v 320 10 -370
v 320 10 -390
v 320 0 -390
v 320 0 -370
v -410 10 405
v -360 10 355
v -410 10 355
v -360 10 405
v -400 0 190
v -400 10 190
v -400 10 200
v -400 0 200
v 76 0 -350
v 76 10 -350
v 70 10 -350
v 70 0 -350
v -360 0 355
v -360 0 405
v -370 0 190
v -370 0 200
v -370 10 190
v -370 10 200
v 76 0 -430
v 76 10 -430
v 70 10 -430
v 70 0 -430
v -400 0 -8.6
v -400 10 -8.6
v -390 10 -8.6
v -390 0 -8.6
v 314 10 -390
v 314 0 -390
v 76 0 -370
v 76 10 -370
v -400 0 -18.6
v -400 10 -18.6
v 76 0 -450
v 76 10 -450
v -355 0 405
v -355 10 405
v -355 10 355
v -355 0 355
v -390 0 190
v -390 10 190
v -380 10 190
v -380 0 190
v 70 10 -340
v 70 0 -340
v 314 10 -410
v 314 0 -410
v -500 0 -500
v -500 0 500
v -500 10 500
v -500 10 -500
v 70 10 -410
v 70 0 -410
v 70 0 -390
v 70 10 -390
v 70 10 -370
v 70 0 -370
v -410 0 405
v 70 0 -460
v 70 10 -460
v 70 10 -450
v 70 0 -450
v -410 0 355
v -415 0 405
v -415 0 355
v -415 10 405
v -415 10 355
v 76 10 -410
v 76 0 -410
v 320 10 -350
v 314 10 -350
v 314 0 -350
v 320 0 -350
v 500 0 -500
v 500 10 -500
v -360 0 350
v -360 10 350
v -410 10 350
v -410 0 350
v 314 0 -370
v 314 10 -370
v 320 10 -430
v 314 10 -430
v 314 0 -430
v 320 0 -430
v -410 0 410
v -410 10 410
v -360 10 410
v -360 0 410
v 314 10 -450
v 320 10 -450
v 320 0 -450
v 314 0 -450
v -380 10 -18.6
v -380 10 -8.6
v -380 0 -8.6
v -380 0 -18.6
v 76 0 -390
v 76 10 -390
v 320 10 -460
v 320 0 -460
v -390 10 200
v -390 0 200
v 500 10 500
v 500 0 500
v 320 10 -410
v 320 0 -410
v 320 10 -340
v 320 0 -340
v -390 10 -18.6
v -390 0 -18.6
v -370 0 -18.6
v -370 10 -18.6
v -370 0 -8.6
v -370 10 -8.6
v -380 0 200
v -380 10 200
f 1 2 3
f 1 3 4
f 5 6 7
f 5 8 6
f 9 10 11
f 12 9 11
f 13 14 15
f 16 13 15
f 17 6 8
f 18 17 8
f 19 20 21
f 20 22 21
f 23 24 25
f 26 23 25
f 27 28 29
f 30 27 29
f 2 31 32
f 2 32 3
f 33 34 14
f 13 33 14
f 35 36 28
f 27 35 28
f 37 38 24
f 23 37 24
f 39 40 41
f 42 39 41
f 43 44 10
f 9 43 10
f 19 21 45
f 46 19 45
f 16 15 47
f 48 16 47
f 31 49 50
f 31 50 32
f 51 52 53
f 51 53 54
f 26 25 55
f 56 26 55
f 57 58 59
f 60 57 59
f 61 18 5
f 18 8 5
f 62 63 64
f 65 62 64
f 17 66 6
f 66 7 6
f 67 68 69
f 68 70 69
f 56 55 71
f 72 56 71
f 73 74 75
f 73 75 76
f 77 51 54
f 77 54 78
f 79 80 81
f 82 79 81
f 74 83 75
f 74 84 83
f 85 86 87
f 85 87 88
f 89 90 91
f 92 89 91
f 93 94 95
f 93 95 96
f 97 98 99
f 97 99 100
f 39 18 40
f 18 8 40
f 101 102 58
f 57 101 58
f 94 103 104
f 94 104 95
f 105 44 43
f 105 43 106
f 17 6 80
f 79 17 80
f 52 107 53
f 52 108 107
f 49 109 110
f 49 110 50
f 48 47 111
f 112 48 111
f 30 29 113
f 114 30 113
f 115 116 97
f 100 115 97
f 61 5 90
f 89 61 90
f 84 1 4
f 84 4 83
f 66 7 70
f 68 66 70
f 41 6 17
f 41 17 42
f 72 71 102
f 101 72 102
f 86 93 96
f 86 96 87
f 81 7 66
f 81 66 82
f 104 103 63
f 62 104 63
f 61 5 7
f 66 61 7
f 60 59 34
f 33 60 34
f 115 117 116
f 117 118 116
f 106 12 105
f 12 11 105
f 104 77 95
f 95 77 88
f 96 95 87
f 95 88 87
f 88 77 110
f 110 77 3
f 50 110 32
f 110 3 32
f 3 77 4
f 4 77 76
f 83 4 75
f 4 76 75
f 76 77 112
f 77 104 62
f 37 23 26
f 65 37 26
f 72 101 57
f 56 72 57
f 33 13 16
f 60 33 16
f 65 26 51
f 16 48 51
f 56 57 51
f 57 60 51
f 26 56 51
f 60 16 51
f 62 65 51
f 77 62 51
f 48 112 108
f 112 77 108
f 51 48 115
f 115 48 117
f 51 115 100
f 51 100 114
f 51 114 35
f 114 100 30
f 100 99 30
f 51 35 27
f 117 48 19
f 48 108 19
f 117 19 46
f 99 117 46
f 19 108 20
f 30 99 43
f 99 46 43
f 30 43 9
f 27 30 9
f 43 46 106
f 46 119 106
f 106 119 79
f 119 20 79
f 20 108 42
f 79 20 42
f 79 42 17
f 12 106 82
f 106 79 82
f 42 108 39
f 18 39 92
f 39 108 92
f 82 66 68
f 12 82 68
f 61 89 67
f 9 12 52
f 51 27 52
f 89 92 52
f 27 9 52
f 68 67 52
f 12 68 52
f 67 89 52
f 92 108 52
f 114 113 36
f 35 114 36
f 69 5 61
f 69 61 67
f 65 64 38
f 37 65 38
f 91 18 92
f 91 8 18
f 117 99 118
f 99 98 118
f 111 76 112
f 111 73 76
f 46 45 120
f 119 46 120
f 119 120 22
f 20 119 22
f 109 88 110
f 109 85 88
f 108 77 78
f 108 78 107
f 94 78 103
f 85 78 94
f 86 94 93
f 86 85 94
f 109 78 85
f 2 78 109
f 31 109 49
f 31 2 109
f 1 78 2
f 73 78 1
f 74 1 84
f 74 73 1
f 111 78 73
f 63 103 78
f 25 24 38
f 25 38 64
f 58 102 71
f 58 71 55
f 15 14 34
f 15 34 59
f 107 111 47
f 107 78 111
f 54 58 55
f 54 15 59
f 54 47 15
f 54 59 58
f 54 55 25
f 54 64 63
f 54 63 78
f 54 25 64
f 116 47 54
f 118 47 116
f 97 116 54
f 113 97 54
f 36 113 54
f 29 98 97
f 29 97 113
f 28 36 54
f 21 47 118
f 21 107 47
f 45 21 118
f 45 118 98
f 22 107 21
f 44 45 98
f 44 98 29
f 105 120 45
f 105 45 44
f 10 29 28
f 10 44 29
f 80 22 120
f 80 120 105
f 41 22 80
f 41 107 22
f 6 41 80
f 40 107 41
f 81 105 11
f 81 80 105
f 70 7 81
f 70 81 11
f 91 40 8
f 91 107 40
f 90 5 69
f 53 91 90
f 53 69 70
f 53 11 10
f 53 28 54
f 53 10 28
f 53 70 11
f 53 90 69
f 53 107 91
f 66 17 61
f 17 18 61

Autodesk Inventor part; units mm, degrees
ref_plane "YZ Plane" through (0, 0, 0) normal (1, 0, 0) x (0, 1, 0)
ref_plane "XZ Plane" through (0, 0, 0) normal (0, 1, 0) x (-1, 0, 0)
ref_plane "XY Plane" through (0, 0, 0) normal (0, 0, 1) x (1, 0, 0)
sketch "Sketch1" plane through (0, 0, 0) normal (0, 1, 0) x (-1, 0, 0)
  line L0 (-500, 500) -> (500, 500)
  line L1 (500, 500) -> (500, -500)
  line L2 (500, -500) -> (-500, -500)
  line L3 (-500, -500) -> (-500, 500)
  line L4 (-500, 500) -> (500, -500) construction
  line L5 (500, 500) -> (-500, -500) construction
  point P0 (0, 0)
  dimension "d0" = 1000
  dimension "d1" = 1000
extrude "Extrusion1" add sketch "Sketch1" along normal blind 10
sketch "Sketch2" plane through (0, 10, 0) normal (0, 1, 0) x (1, 0, 0)
  line L0 (-400, -200) -> (-370, -200)
  line L1 (-370, -200) -> (-370, -190)
  line L2 (-370, -190) -> (-400, -190)
  line L3 (-400, -190) -> (-400, -200)
  line L4 (-500, 500) -> (-500, -500) projected
  line L5 (-500, -500) -> (500, -500) projected
  line L6 (-390, -190) -> (-390, -200)
  line L7 (-380, -190) -> (-380, -200)
  point P0 (0, 0)
  point P1 (-400, -195)
  point P2 (-390, -195)
  point P3 (-380, -195)
  dimension "d5" = 30
  dimension "d6" = 10
  dimension "d7" = 100
  dimension "d8" = 300
  dimension "d9" = 10
  dimension "d10" = 10
extrude "Extrusion2" cut sketch "Sketch2" against normal blind 10 contours L3 L2 L6 L0 | L7 L2 L1 L0
sketch "Sketch3" plane through (0, 10, 0) normal (0, 1, 0) x (1, 0, 0)
  line L0 (-400, -190) -> (-390, -190) projected
  line L1 (-400, -200) -> (-400, -190) projected
  line L2 (-390, -190) -> (-390, -200) projected
  line L3 (-390, -200) -> (-400, -200) projected
  line L4 (-380, -200) -> (-380, -190) projected
  line L5 (-380, -190) -> (-370, -190) projected
  line L6 (-370, -190) -> (-370, -200) projected
  line L7 (-370, -200) -> (-380, -200) projected
  line L8 (-400, 8.6) -> (-370, 8.6)
  line L9 (-370, 8.6) -> (-370, 18.6)
  line L10 (-370, 18.6) -> (-400, 18.6)
  line L11 (-400, 18.6) -> (-400, 8.6)
  line L12 (-380, 8.6) -> (-380, 18.6)
  line L13 (-390, 8.6) -> (-390, 18.6)
  point P0 (0, 0)
  point P1 (-380, 13.6)
  point P2 (-375, -190)
  dimension "d13" = 30
  dimension "d14" = 10
  dimension "d15" = 10
  dimension "d16" = 10
  dimension "d17" = 198.6
  dimension "d18" = 10
extrude "Extrusion3" cut sketch "Sketch3" against normal blind 10 contours L11 L10 L13 L8 | L12 L10 L9 L8
sketch "Sketch4" plane through (0, 10, 0) normal (0, 1, 0) x (1, 0, 0)
  line L0 (-405, -400) -> (-365, -400)
  line L1 (-365, -400) -> (-365, -360)
  line L2 (-365, -360) -> (-405, -360)
  line L3 (-405, -360) -> (-405, -400)
  line L4 (-405, -400) -> (-365, -360) construction
  line L5 (-365, -400) -> (-405, -360) construction
  line L6 (-500, 500) -> (-500, -500) projected
  line L7 (-500, -500) -> (500, -500) projected
  line L8 (-410, -355) -> (-360, -355)
  line L9 (-360, -355) -> (-360, -405)
  line L10 (-360, -405) -> (-410, -405)
  line L11 (-410, -405) -> (-410, -355)
  line L12 (-355, -350) -> (-415, -350)
  line L13 (-415, -350) -> (-415, -410)
  line L14 (-415, -410) -> (-355, -410)
  line L15 (-355, -410) -> (-355, -350)
  line L16 (-410, -355) -> (-415, -355)
  line L17 (-410, -355) -> (-410, -350)
  line L18 (-360, -355) -> (-360, -350)
  line L19 (-360, -355) -> (-355, -355)
  line L20 (-410, -405) -> (-410, -410)
  line L21 (-410, -405) -> (-415, -405)
  line L22 (-360, -405) -> (-360, -410)
  line L23 (-360, -405) -> (-355, -405)
  point P0 (0, 0)
  point P1 (-385, -380)
  point P2 (-405, -380)
  dimension "d21" = 40
  dimension "d22" = 40
  dimension "d23" = 95
  dimension "d24" = 100
  dimension "d25" = 5
  dimension "d26" = 5
extrude "Extrusion4" cut sketch "Sketch4" against normal blind 10 contours L17 L12 L18 L8 | L11 L21 L13 L16 | L19 L15 L23 L9 | L10 L22 L14 L20
sketch "Sketch5" plane through (0, 10, 0) normal (0, 1, 0) x (1, 0, 0)
  line L0 (120, 340) -> (120, 460)
  circle A0 centre (200, 400) radius 50
  line L1 (120, 340) -> (270, 340)
  line L2 (270, 460) -> (120, 460)
  line L3 (120, 460) -> (120, 450)
  line L4 (120, 450) -> (126, 450)
  line L5 (126, 450) -> (126, 430)
  line L6 (126, 430) -> (120, 430)
  line L7 (120, 430) -> (120, 410)
  line L8 (120, 410) -> (126, 410)
  line L9 (126, 410) -> (126, 390)
  line L10 (126, 390) -> (120, 390)
  line L11 (120, 390) -> (120, 370)
  line L12 (120, 370) -> (126, 370)
  line L13 (126, 370) -> (126, 350)
  line L14 (126, 350) -> (120, 350)
  line L15 (120, 460) -> (70, 460)
  line L16 (70, 460) -> (70, 450)
  line L17 (70, 450) -> (76, 450)
  line L18 (76, 450) -> (76, 430)
  line L19 (76, 430) -> (70, 430)
  line L20 (70, 430) -> (70, 410)
  line L21 (70, 410) -> (76, 410)
  line L22 (76, 410) -> (76, 390)
  line L23 (76, 390) -> (70, 390)
  line L24 (70, 390) -> (70, 370)
  line L25 (70, 370) -> (76, 370)
  line L26 (76, 370) -> (76, 350)
  line L27 (76, 350) -> (70, 350)
  line L28 (70, 350) -> (70, 340)
  line L29 (70, 340) -> (120, 340)
  line L30 (272.052, 455.4405) -> (266.0681, 455)
  line L31 (266.0681, 455) -> (267.5363, 435.054)
  line L32 (270, 460) -> (320, 460)
  line L33 (320, 460) -> (320, 450)
  line L34 (320, 450) -> (314, 450)
  line L35 (314, 450) -> (314, 430)
  line L36 (314, 430) -> (320, 430)
  line L37 (320, 430) -> (320, 410)
  line L38 (320, 410) -> (314, 410)
  line L39 (314, 410) -> (314, 390)
  line L40 (314, 390) -> (320, 390)
  line L41 (320, 390) -> (320, 370)
  line L42 (320, 370) -> (314, 370)
  line L43 (314, 370) -> (314, 350)
  line L44 (314, 350) -> (320, 350)
  line L45 (320, 350) -> (320, 340)
  line L46 (320, 340) -> (270, 340)
  line L47 (270, 460) -> (270, 340)
  line L48 (267.5363, 435.054) -> (270, 435.054)
  line L49 (270, 435.054) -> (270, 430.054)
  line L50 (270, 430.054) -> (266.0681, 430.054)
  line L51 (266.0681, 430.054) -> (266.0681, 410.054)
  line L52 (266.0681, 410.054) -> (270, 410.054)
  line L53 (120, 460) -> (120, 466)
  line L54 (272.0681, 465) -> (270, 460)
  line L55 (120, 466) -> (130, 466)
  line L56 (130, 466) -> (130, 460)
  line L57 (130, 460) -> (150, 460)
  line L58 (150, 460) -> (150, 466)
  line L59 (150, 466) -> (170, 466)
  line L60 (170, 466) -> (170, 460)
  line L61 (170, 460) -> (190, 460)
  line L62 (190, 460) -> (190, 466)
  line L63 (190, 466) -> (210, 466)
  line L64 (210, 466) -> (210, 460)
  line L65 (210, 460) -> (230, 460)
  line L66 (230, 460) -> (230, 466)
  line L67 (230, 466) -> (250, 466)
  line L68 (250, 466) -> (250, 460)
  line L69 (250, 460) -> (260, 460)
  line L70 (260, 460) -> (260, 465)
  line L71 (260, 465) -> (272.0681, 465)
  line L72 (500, 500) -> (-500, 500) projected
  line L73 (500, -500) -> (500, 500) projected
  point P0 (0, 0)
  dimension "d29" = 100
  dimension "d30" = 120
  dimension "d31" = 150
  dimension "d32" = 80
  dimension "d33" = 60
  dimension "d34" = 10
  dimension "d35" = 6
  dimension "d36" = 20
  dimension "d37" = 20
  dimension "d38" = 20
  dimension "d39" = 20
  dimension "d40" = 20
  dimension "d41" = 50
  dimension "d42" = 10
  dimension "d43" = 6
  dimension "d44" = 5
  dimension "d45" = 6
  dimension "d46" = 50
  dimension "d47" = 6
  dimension "d48" = 5
  dimension "d49" = 20
  dimension "d50" = 20
  dimension "d51" = 6
  dimension "d52" = 10
  dimension "d53" = 20
  dimension "d54" = 20
  dimension "d55" = 20
  dimension "d56" = 20
  dimension "d57" = 20
  dimension "d58" = 20
  dimension "d59" = 10
  dimension "d60" = 100
  dimension "d61" = 300
extrude "Extrusion5" cut sketch "Sketch5" against normal blind 80 contours L29 L28 L27 L26 L25 L24 L23 L22 L21 L20 L19 L18 L17 L16 L15 L0 | L0 L14 L13 L12 L10 L9 L8 L6 L5 L4 L2 L47 L30 L31 L48 L50 L51 L52 L1 | L0 L12 L13 L14 | L47 L32 L33 L34 L35 L36 L37 L38 L39 L40 L41 L42 L43 L44 L45 L46 | L52 L51 L50 L47 | L0 L8 L9 L10 | L48 L31 L30 L47 | L0 L4 L5 L6 | A0
equation "\"d62\" = d32"
properties part number "Base"
